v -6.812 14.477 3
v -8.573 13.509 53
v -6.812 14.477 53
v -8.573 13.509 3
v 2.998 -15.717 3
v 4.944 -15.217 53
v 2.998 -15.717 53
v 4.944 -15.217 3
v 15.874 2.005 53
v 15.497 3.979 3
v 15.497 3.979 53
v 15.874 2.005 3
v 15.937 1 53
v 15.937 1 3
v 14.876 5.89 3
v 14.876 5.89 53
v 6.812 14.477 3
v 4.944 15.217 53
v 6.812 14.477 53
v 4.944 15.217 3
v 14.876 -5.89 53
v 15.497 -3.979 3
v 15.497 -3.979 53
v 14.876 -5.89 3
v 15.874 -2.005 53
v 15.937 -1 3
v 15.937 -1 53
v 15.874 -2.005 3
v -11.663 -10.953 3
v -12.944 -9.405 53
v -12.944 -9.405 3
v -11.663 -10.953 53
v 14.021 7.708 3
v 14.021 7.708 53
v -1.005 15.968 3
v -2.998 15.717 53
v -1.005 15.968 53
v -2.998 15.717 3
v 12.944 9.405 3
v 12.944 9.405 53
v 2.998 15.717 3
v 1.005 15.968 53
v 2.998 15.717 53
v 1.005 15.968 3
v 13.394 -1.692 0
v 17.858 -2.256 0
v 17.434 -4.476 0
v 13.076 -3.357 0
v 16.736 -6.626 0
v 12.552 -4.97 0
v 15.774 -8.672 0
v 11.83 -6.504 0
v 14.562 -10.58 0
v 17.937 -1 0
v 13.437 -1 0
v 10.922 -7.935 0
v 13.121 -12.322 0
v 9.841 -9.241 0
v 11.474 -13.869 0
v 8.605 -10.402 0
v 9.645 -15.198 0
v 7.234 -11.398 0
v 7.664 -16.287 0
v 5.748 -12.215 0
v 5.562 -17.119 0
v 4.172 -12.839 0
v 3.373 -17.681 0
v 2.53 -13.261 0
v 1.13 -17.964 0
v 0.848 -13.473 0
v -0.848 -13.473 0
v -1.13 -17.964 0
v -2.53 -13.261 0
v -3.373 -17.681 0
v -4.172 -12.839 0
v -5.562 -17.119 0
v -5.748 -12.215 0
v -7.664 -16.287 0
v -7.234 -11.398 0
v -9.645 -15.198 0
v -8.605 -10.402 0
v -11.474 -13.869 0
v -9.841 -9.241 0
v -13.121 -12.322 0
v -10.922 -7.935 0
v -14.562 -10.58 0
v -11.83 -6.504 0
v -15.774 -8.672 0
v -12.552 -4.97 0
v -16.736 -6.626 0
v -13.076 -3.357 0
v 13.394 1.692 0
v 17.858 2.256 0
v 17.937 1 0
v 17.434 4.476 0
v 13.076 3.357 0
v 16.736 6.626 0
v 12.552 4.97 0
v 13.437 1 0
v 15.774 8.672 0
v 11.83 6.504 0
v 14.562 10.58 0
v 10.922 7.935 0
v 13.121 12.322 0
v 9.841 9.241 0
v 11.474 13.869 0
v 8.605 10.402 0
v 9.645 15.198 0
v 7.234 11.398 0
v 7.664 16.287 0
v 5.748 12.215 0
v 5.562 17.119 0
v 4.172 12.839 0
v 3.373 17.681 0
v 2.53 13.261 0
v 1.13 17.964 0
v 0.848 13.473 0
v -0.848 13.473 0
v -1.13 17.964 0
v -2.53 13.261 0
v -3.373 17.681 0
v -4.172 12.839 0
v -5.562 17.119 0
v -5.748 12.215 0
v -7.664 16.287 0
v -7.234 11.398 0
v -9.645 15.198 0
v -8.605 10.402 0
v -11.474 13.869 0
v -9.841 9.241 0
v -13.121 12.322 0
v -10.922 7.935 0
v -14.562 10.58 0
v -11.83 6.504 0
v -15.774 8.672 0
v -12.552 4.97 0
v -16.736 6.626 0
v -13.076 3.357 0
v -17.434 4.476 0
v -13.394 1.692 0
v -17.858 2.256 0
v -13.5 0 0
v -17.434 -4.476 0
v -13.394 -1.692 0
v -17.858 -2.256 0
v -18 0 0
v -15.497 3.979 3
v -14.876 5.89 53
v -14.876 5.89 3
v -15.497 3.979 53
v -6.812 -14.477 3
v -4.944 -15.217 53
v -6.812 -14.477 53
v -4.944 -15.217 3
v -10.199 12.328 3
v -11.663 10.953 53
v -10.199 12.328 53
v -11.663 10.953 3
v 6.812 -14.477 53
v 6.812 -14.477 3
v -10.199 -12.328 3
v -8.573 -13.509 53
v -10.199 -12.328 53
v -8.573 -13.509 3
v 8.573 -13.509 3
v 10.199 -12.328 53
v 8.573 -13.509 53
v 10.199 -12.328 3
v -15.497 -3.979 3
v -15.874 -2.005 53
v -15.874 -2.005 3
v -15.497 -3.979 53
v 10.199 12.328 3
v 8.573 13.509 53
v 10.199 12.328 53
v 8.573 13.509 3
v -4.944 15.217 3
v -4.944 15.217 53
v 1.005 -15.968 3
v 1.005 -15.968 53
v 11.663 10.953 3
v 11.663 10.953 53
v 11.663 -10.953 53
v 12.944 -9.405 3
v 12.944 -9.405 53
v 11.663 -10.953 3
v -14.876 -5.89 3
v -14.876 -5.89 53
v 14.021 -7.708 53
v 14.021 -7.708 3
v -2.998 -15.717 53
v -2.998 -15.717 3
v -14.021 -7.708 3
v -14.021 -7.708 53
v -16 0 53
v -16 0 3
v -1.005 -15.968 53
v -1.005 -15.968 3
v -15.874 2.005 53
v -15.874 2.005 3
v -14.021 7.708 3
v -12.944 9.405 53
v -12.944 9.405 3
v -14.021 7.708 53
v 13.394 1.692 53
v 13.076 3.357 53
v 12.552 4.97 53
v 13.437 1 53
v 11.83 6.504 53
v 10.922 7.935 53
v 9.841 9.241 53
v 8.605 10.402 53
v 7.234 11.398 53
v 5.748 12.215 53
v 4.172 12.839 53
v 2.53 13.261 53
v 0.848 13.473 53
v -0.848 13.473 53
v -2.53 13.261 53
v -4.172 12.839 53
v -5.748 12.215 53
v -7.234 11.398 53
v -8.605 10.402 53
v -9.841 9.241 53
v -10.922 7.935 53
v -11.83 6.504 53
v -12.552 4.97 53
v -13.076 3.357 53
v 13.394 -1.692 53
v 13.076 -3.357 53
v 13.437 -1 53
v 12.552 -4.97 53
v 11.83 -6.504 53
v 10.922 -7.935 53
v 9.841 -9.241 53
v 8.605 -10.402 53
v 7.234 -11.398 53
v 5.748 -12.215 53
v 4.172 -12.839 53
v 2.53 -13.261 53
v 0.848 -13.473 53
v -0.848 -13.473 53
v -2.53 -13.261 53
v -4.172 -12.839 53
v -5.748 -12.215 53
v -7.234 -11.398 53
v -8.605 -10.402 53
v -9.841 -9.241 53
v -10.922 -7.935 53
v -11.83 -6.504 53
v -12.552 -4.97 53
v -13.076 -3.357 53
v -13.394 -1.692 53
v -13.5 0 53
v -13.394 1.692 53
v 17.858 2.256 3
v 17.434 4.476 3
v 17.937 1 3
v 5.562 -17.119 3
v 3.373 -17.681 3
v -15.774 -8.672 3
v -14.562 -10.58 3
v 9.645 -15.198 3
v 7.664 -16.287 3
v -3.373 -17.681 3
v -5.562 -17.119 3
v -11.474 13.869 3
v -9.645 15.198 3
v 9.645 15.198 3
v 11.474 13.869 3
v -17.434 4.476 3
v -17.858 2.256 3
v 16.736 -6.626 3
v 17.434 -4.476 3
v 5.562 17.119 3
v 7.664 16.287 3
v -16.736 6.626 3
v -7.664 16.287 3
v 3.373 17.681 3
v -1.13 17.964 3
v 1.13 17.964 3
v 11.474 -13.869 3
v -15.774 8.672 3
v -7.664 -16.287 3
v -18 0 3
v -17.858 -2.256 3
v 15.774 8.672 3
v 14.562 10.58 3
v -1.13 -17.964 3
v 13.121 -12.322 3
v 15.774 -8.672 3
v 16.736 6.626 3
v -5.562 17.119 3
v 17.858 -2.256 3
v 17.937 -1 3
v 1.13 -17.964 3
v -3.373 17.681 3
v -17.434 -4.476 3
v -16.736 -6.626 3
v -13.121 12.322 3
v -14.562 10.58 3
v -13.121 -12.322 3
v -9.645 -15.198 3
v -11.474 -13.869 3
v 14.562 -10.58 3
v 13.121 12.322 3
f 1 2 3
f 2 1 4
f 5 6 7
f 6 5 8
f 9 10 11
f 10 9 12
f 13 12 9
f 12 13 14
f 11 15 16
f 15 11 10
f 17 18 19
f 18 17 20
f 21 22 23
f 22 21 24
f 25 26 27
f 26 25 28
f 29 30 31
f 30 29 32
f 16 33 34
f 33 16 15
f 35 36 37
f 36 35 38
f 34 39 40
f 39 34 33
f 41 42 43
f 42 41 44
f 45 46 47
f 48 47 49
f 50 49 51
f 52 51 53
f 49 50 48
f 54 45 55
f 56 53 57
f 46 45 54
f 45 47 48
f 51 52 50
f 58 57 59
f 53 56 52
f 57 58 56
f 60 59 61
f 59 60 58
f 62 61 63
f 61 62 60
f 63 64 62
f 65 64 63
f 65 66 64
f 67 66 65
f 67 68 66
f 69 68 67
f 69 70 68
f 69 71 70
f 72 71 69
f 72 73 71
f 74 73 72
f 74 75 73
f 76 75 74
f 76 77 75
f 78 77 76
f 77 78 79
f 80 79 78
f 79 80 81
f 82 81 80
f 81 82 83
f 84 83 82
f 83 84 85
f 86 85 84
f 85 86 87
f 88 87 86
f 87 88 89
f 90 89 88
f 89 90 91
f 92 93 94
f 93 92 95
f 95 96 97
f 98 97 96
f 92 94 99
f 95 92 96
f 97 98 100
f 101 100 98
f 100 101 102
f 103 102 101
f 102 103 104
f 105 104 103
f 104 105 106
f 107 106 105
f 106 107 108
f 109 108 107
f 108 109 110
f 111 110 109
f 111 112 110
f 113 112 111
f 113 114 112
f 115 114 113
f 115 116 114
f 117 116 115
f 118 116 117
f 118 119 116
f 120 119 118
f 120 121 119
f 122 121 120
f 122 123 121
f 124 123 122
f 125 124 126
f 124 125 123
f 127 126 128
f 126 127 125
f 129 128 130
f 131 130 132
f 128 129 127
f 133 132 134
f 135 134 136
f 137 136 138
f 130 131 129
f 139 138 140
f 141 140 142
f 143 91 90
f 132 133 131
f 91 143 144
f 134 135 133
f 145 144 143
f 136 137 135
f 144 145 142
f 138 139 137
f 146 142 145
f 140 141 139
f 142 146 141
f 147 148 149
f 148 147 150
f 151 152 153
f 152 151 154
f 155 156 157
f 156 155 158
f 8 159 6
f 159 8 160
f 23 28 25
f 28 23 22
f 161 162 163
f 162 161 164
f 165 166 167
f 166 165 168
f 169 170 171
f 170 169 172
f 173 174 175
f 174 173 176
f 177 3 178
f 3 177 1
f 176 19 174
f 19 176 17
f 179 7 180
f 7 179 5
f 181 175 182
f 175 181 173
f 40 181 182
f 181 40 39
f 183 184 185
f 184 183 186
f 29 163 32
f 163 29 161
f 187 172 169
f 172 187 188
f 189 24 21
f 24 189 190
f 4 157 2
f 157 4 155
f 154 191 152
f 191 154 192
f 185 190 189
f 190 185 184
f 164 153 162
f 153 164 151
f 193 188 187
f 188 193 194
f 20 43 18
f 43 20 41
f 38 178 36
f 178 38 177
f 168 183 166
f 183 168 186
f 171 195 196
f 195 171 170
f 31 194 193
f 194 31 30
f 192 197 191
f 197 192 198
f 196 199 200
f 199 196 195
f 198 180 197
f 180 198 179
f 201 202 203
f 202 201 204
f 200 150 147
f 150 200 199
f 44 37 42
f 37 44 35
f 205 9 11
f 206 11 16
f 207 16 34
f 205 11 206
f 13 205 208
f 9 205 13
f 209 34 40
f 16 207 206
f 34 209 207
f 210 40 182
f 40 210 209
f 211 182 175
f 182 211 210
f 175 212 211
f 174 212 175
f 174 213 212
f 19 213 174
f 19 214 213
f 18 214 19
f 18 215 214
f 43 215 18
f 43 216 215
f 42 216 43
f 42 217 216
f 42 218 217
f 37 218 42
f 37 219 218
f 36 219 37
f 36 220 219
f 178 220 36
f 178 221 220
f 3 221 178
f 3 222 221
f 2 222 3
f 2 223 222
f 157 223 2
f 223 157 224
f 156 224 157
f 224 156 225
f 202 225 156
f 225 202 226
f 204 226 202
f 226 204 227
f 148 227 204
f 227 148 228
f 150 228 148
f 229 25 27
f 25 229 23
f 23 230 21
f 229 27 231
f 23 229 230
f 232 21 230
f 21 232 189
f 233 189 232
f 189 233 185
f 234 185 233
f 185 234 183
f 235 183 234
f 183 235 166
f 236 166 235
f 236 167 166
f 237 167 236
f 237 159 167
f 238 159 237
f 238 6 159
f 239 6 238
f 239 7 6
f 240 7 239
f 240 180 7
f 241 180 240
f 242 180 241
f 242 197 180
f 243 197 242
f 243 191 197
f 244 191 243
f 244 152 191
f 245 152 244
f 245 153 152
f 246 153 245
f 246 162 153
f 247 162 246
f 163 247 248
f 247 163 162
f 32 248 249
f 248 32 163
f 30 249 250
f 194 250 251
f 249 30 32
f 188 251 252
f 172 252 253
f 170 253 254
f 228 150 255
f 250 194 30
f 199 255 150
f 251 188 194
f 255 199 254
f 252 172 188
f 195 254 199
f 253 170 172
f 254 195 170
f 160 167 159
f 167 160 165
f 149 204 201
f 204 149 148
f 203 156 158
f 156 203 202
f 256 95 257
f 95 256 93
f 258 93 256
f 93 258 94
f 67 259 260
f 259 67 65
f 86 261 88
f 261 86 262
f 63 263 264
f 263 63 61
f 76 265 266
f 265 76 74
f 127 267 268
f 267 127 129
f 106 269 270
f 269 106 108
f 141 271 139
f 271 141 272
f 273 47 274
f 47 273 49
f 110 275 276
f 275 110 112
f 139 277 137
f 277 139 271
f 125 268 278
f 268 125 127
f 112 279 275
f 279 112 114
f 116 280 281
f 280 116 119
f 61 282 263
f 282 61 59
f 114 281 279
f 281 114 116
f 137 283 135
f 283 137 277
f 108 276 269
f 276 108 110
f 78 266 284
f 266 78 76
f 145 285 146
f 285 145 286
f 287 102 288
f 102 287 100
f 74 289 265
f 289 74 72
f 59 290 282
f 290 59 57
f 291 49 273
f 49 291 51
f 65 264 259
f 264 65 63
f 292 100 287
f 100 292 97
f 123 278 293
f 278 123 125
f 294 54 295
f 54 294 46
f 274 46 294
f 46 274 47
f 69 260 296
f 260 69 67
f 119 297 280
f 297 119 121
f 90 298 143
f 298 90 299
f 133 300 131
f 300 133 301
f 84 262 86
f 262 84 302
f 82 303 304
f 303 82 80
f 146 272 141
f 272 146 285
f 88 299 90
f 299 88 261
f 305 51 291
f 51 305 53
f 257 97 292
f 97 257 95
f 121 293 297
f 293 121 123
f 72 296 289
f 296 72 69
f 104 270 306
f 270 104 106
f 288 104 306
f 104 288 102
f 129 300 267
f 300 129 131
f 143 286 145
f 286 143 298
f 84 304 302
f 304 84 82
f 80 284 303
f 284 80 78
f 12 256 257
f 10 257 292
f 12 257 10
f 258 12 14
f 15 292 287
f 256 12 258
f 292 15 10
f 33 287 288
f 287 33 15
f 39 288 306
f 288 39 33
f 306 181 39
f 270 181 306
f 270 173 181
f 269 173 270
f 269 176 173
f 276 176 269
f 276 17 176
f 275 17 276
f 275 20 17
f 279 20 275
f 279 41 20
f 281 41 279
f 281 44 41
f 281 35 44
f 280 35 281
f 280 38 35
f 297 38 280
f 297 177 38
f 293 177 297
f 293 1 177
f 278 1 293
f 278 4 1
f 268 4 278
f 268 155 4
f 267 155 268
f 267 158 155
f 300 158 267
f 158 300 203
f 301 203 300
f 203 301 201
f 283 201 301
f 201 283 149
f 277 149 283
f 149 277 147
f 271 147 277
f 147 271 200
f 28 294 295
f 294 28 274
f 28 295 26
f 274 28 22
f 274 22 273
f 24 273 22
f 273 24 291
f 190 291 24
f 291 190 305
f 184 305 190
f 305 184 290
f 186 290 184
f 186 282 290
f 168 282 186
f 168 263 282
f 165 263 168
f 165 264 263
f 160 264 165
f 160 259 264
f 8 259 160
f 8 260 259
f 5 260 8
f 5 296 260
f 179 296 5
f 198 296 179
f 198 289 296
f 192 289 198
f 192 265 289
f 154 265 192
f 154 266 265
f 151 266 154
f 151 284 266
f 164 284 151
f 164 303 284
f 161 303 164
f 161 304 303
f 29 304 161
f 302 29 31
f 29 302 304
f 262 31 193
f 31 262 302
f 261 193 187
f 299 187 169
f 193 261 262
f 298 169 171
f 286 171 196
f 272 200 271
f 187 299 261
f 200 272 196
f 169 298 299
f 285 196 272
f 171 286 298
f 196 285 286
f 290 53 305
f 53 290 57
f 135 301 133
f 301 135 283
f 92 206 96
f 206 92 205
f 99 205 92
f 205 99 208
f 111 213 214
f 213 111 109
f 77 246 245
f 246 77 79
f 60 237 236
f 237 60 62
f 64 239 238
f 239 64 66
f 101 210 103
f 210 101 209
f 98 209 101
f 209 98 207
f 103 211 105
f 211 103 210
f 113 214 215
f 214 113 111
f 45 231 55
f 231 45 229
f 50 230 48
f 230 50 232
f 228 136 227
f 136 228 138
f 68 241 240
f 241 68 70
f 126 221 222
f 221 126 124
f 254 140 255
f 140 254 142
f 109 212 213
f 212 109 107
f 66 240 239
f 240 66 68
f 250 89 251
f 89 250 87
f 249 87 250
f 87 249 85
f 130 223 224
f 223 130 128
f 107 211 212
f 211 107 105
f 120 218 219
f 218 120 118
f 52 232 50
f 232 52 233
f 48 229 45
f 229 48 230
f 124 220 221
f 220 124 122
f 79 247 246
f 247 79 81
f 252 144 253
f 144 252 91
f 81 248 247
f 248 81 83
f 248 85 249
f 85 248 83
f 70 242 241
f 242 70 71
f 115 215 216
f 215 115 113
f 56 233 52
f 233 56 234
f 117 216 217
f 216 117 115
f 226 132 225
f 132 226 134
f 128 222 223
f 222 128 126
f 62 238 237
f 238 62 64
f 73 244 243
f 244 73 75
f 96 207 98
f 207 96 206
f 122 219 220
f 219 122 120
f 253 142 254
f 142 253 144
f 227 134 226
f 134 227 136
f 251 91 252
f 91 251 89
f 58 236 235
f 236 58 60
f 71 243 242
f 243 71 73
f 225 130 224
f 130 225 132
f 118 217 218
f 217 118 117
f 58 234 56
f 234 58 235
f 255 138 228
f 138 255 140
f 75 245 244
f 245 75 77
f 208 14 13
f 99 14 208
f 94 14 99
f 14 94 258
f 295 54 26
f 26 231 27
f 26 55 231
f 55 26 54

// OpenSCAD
$fn=50;
hoehe=50;
dm=32;
idm=27;
kragen=36;
schlitz=2;
difference(){
union(){
cylinder(hoehe+3,d=dm,d=dm);
cylinder(3,d=kragen,d=kragen);
}
union() {
cylinder(hoehe*2,d=idm,d=idm);
translate( [0,-schlitz*0.5, 0]) { cube([kragen,schlitz,hoehe*2]);}}
}
